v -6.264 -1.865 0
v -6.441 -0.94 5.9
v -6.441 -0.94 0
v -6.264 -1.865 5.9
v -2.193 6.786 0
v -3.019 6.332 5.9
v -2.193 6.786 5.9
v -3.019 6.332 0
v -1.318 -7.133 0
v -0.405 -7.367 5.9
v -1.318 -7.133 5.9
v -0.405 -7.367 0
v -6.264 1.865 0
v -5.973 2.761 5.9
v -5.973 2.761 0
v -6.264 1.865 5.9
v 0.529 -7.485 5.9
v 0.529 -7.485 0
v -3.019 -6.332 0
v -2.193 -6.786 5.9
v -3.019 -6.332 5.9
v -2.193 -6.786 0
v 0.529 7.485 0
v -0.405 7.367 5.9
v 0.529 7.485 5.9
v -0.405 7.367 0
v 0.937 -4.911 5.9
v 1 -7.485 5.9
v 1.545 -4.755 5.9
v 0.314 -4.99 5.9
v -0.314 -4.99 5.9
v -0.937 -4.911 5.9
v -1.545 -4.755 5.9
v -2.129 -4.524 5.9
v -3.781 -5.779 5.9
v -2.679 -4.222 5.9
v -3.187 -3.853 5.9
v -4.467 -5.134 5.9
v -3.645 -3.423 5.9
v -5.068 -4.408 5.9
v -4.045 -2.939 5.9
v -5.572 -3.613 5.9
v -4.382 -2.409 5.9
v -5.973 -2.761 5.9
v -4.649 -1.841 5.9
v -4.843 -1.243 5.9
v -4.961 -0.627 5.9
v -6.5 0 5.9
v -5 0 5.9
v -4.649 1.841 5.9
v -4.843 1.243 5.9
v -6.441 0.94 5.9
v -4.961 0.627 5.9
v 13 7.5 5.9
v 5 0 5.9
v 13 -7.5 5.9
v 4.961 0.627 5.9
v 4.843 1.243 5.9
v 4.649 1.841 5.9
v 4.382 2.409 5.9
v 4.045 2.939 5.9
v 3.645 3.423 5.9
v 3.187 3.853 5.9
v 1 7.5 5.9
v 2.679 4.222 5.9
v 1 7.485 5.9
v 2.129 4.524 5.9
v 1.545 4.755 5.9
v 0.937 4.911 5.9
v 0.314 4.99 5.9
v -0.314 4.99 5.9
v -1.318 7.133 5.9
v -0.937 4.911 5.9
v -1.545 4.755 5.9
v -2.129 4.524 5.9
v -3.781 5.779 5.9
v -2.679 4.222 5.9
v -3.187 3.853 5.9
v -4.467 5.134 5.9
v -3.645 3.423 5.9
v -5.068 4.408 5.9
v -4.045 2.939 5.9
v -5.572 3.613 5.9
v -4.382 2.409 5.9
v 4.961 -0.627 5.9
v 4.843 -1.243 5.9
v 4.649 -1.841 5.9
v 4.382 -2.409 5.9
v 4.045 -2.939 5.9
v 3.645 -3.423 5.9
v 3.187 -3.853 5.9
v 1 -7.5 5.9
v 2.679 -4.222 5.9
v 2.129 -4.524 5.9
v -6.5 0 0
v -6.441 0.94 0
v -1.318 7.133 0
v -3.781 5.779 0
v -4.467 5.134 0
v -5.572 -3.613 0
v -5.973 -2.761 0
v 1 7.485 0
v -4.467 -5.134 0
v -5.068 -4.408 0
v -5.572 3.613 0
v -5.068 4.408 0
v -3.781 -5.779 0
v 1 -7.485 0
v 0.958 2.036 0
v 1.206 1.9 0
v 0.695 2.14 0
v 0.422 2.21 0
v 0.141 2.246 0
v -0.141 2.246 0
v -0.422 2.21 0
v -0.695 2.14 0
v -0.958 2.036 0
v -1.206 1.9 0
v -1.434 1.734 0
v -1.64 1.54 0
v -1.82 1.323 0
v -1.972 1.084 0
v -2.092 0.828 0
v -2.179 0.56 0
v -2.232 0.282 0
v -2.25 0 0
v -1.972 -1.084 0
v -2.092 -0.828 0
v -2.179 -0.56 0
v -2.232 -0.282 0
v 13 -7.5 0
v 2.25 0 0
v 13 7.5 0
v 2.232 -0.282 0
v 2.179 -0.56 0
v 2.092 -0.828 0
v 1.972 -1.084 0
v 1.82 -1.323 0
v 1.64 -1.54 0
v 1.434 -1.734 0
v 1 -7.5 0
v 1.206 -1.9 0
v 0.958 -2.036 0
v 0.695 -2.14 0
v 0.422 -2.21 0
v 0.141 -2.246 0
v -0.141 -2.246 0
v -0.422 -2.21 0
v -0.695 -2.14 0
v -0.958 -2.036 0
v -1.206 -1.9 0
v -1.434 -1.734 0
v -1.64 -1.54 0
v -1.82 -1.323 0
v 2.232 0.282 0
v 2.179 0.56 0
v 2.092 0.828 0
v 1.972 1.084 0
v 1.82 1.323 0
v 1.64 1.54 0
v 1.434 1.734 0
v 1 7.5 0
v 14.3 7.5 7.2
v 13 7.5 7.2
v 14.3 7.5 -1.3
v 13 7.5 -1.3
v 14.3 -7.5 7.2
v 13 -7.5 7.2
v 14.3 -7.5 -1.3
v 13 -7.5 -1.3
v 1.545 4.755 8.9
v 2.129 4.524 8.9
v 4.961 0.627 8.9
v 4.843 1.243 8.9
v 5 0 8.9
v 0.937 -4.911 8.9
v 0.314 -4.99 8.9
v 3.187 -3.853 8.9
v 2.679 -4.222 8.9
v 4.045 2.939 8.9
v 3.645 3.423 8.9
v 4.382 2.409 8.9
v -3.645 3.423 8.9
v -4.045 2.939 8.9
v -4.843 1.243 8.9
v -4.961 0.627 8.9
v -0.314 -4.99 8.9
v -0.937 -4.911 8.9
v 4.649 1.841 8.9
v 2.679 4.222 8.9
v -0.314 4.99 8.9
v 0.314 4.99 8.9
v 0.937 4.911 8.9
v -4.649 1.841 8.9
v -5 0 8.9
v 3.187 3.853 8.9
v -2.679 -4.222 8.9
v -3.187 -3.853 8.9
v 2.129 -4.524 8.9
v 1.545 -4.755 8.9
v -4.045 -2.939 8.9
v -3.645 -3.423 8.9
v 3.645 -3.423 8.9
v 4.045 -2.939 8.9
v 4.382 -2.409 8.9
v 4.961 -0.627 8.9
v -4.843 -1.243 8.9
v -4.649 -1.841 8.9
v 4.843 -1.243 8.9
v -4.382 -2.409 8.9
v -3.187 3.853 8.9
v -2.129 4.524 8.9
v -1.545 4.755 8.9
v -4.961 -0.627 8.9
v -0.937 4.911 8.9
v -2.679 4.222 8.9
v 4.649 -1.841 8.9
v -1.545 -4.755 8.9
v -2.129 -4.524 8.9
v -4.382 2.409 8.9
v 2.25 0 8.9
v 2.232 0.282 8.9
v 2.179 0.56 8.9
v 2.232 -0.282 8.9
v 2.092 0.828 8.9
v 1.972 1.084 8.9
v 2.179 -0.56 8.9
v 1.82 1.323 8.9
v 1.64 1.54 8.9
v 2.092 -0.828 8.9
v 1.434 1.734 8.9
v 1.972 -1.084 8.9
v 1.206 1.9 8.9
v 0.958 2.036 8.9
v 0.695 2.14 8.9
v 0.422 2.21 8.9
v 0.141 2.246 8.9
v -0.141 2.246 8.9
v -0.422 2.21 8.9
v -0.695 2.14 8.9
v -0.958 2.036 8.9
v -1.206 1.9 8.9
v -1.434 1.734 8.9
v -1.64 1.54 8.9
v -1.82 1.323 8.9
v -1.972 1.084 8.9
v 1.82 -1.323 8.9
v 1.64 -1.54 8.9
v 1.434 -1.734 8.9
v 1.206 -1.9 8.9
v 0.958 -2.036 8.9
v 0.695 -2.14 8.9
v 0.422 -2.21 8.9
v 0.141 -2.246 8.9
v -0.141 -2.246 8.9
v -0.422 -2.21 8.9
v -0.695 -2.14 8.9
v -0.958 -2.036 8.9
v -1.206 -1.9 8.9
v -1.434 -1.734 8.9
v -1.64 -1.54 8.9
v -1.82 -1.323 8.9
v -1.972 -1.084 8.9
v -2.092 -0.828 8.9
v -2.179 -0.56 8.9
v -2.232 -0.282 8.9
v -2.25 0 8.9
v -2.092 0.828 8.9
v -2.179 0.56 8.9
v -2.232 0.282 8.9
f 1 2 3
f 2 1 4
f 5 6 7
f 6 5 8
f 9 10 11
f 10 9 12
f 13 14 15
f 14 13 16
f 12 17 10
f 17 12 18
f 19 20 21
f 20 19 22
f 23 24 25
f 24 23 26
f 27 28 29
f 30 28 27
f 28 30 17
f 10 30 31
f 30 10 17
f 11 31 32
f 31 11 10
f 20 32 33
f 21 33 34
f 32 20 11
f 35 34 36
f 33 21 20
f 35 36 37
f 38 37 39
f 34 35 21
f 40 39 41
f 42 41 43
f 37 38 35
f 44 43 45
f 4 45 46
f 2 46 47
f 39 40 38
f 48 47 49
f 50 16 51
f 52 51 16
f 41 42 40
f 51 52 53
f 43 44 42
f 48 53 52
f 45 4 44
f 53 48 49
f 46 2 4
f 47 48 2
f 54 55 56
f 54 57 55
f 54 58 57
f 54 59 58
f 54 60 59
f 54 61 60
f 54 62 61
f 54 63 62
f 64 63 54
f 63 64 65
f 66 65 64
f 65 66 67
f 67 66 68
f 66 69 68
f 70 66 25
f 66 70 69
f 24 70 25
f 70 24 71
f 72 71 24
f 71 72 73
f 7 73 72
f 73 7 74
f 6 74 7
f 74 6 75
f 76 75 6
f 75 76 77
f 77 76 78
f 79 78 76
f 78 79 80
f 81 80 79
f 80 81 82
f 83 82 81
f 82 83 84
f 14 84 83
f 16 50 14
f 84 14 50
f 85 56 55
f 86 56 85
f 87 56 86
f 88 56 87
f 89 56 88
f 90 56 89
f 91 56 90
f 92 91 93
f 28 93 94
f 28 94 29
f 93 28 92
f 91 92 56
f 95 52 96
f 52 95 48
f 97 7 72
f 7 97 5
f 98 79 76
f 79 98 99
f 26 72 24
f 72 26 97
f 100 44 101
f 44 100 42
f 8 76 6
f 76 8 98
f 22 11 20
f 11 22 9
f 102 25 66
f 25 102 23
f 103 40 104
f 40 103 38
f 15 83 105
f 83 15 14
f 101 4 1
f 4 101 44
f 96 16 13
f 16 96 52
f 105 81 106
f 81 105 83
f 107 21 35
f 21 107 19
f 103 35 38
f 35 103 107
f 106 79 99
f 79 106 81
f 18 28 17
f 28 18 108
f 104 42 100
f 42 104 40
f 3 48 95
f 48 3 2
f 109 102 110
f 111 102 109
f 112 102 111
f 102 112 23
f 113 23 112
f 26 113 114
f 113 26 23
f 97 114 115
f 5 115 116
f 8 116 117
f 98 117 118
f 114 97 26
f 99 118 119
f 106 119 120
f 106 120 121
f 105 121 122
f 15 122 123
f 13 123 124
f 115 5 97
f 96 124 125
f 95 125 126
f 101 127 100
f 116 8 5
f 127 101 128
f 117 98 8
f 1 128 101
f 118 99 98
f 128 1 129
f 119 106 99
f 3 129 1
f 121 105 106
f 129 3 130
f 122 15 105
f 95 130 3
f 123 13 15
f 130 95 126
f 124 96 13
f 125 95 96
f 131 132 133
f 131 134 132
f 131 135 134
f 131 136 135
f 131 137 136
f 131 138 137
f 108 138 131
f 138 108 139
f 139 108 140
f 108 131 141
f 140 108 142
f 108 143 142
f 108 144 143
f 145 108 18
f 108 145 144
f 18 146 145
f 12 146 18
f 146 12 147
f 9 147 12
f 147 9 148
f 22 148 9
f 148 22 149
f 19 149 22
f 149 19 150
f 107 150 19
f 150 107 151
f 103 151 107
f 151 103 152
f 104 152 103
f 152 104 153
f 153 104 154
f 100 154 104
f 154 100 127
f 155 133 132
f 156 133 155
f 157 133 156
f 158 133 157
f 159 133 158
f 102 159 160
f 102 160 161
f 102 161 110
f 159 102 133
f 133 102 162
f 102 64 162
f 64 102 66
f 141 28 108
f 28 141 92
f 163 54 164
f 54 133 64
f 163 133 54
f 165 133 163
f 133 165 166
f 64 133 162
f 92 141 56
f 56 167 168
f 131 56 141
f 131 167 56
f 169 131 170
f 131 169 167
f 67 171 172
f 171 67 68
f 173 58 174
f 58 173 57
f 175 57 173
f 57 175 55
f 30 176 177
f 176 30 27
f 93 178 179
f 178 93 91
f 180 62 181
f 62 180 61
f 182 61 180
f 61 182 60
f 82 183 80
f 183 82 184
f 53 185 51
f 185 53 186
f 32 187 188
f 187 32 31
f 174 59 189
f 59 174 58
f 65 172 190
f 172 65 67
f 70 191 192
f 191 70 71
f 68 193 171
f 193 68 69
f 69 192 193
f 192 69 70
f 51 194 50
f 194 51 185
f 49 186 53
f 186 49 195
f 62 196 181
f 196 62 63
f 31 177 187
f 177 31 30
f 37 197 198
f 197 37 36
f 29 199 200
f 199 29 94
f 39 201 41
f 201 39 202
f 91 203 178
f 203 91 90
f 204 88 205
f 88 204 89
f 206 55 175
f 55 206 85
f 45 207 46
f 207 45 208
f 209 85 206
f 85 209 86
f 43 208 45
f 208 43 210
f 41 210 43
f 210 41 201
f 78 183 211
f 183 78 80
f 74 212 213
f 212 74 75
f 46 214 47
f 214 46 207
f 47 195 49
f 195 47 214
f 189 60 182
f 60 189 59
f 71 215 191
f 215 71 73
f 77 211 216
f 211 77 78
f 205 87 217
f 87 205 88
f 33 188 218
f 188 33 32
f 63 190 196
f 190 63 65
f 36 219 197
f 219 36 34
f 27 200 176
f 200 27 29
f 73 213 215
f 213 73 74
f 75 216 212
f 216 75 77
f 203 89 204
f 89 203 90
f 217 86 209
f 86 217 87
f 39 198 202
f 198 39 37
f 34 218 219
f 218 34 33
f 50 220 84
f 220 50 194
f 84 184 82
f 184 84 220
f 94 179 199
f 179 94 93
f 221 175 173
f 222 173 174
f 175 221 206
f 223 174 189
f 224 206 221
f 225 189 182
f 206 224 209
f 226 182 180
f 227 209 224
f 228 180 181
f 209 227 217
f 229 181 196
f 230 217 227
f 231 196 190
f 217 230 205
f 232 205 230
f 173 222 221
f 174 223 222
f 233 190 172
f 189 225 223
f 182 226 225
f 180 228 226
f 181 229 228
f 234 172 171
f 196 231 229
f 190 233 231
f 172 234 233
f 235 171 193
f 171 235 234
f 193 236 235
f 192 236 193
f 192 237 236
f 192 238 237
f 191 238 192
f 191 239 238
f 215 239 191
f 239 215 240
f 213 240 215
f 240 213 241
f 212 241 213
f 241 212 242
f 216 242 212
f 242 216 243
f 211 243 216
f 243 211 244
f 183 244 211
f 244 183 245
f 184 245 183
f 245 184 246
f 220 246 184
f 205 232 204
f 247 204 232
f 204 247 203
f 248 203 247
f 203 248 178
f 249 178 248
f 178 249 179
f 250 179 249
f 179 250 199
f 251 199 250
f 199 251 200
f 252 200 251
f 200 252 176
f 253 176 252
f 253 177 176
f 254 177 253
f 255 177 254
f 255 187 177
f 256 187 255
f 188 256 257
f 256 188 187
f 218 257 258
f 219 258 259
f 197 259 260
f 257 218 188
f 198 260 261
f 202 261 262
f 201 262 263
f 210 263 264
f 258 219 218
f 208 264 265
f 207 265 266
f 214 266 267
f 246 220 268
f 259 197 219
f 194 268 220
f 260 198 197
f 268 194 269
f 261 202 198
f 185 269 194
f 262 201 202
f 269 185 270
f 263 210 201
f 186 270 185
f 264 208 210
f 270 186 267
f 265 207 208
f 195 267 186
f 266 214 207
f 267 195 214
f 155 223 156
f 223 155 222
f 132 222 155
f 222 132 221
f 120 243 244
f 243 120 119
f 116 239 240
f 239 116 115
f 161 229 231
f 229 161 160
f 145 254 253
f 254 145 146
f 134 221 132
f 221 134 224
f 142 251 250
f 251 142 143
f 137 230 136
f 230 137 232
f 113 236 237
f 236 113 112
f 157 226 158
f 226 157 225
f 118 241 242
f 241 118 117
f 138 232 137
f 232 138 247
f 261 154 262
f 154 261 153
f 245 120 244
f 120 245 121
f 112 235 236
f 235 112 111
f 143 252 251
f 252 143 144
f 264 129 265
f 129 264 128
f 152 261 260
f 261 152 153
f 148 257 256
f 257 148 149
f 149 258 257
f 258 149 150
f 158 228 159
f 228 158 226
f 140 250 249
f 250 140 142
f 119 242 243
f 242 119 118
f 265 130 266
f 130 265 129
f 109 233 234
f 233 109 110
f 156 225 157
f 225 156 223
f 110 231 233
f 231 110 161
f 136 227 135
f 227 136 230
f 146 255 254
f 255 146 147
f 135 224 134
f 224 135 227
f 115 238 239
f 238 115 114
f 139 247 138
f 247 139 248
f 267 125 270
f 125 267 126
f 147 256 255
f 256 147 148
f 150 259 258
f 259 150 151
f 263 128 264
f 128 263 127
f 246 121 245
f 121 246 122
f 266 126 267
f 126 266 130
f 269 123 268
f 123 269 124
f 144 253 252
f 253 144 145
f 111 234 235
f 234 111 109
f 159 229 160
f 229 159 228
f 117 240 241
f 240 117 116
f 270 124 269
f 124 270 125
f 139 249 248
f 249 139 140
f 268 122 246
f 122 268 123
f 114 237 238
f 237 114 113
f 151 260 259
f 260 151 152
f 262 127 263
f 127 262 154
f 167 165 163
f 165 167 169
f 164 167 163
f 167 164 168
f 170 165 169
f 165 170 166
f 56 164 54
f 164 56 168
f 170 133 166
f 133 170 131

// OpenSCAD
$fn=50;

X = 13;
Y = 15;
B = 1.3;
ZZ = 8.5;
Z = ZZ - (2*B);

R1 = 5;
module xxx() {
    for (z =[0:10])
        rotate([0,0,18*z])
                cube([R1,0.4,1]);
}

module base() {
    
    union(){
        translate([1,0,0]){
            cylinder(Z,d=Y);
            translate([0, -Y/2, 0]) cube([X,Y,Z]);
        }
        cylinder(Z+3,r=R1);
//        translate([0,0,Z+3]) 
//        xxx();
    }
}


difference() {
     base();

    //cutout
    cylinder(10,d=4.5);
}

translate([X,-Y/2,-B])
cube([1.3,Y,ZZ]);
